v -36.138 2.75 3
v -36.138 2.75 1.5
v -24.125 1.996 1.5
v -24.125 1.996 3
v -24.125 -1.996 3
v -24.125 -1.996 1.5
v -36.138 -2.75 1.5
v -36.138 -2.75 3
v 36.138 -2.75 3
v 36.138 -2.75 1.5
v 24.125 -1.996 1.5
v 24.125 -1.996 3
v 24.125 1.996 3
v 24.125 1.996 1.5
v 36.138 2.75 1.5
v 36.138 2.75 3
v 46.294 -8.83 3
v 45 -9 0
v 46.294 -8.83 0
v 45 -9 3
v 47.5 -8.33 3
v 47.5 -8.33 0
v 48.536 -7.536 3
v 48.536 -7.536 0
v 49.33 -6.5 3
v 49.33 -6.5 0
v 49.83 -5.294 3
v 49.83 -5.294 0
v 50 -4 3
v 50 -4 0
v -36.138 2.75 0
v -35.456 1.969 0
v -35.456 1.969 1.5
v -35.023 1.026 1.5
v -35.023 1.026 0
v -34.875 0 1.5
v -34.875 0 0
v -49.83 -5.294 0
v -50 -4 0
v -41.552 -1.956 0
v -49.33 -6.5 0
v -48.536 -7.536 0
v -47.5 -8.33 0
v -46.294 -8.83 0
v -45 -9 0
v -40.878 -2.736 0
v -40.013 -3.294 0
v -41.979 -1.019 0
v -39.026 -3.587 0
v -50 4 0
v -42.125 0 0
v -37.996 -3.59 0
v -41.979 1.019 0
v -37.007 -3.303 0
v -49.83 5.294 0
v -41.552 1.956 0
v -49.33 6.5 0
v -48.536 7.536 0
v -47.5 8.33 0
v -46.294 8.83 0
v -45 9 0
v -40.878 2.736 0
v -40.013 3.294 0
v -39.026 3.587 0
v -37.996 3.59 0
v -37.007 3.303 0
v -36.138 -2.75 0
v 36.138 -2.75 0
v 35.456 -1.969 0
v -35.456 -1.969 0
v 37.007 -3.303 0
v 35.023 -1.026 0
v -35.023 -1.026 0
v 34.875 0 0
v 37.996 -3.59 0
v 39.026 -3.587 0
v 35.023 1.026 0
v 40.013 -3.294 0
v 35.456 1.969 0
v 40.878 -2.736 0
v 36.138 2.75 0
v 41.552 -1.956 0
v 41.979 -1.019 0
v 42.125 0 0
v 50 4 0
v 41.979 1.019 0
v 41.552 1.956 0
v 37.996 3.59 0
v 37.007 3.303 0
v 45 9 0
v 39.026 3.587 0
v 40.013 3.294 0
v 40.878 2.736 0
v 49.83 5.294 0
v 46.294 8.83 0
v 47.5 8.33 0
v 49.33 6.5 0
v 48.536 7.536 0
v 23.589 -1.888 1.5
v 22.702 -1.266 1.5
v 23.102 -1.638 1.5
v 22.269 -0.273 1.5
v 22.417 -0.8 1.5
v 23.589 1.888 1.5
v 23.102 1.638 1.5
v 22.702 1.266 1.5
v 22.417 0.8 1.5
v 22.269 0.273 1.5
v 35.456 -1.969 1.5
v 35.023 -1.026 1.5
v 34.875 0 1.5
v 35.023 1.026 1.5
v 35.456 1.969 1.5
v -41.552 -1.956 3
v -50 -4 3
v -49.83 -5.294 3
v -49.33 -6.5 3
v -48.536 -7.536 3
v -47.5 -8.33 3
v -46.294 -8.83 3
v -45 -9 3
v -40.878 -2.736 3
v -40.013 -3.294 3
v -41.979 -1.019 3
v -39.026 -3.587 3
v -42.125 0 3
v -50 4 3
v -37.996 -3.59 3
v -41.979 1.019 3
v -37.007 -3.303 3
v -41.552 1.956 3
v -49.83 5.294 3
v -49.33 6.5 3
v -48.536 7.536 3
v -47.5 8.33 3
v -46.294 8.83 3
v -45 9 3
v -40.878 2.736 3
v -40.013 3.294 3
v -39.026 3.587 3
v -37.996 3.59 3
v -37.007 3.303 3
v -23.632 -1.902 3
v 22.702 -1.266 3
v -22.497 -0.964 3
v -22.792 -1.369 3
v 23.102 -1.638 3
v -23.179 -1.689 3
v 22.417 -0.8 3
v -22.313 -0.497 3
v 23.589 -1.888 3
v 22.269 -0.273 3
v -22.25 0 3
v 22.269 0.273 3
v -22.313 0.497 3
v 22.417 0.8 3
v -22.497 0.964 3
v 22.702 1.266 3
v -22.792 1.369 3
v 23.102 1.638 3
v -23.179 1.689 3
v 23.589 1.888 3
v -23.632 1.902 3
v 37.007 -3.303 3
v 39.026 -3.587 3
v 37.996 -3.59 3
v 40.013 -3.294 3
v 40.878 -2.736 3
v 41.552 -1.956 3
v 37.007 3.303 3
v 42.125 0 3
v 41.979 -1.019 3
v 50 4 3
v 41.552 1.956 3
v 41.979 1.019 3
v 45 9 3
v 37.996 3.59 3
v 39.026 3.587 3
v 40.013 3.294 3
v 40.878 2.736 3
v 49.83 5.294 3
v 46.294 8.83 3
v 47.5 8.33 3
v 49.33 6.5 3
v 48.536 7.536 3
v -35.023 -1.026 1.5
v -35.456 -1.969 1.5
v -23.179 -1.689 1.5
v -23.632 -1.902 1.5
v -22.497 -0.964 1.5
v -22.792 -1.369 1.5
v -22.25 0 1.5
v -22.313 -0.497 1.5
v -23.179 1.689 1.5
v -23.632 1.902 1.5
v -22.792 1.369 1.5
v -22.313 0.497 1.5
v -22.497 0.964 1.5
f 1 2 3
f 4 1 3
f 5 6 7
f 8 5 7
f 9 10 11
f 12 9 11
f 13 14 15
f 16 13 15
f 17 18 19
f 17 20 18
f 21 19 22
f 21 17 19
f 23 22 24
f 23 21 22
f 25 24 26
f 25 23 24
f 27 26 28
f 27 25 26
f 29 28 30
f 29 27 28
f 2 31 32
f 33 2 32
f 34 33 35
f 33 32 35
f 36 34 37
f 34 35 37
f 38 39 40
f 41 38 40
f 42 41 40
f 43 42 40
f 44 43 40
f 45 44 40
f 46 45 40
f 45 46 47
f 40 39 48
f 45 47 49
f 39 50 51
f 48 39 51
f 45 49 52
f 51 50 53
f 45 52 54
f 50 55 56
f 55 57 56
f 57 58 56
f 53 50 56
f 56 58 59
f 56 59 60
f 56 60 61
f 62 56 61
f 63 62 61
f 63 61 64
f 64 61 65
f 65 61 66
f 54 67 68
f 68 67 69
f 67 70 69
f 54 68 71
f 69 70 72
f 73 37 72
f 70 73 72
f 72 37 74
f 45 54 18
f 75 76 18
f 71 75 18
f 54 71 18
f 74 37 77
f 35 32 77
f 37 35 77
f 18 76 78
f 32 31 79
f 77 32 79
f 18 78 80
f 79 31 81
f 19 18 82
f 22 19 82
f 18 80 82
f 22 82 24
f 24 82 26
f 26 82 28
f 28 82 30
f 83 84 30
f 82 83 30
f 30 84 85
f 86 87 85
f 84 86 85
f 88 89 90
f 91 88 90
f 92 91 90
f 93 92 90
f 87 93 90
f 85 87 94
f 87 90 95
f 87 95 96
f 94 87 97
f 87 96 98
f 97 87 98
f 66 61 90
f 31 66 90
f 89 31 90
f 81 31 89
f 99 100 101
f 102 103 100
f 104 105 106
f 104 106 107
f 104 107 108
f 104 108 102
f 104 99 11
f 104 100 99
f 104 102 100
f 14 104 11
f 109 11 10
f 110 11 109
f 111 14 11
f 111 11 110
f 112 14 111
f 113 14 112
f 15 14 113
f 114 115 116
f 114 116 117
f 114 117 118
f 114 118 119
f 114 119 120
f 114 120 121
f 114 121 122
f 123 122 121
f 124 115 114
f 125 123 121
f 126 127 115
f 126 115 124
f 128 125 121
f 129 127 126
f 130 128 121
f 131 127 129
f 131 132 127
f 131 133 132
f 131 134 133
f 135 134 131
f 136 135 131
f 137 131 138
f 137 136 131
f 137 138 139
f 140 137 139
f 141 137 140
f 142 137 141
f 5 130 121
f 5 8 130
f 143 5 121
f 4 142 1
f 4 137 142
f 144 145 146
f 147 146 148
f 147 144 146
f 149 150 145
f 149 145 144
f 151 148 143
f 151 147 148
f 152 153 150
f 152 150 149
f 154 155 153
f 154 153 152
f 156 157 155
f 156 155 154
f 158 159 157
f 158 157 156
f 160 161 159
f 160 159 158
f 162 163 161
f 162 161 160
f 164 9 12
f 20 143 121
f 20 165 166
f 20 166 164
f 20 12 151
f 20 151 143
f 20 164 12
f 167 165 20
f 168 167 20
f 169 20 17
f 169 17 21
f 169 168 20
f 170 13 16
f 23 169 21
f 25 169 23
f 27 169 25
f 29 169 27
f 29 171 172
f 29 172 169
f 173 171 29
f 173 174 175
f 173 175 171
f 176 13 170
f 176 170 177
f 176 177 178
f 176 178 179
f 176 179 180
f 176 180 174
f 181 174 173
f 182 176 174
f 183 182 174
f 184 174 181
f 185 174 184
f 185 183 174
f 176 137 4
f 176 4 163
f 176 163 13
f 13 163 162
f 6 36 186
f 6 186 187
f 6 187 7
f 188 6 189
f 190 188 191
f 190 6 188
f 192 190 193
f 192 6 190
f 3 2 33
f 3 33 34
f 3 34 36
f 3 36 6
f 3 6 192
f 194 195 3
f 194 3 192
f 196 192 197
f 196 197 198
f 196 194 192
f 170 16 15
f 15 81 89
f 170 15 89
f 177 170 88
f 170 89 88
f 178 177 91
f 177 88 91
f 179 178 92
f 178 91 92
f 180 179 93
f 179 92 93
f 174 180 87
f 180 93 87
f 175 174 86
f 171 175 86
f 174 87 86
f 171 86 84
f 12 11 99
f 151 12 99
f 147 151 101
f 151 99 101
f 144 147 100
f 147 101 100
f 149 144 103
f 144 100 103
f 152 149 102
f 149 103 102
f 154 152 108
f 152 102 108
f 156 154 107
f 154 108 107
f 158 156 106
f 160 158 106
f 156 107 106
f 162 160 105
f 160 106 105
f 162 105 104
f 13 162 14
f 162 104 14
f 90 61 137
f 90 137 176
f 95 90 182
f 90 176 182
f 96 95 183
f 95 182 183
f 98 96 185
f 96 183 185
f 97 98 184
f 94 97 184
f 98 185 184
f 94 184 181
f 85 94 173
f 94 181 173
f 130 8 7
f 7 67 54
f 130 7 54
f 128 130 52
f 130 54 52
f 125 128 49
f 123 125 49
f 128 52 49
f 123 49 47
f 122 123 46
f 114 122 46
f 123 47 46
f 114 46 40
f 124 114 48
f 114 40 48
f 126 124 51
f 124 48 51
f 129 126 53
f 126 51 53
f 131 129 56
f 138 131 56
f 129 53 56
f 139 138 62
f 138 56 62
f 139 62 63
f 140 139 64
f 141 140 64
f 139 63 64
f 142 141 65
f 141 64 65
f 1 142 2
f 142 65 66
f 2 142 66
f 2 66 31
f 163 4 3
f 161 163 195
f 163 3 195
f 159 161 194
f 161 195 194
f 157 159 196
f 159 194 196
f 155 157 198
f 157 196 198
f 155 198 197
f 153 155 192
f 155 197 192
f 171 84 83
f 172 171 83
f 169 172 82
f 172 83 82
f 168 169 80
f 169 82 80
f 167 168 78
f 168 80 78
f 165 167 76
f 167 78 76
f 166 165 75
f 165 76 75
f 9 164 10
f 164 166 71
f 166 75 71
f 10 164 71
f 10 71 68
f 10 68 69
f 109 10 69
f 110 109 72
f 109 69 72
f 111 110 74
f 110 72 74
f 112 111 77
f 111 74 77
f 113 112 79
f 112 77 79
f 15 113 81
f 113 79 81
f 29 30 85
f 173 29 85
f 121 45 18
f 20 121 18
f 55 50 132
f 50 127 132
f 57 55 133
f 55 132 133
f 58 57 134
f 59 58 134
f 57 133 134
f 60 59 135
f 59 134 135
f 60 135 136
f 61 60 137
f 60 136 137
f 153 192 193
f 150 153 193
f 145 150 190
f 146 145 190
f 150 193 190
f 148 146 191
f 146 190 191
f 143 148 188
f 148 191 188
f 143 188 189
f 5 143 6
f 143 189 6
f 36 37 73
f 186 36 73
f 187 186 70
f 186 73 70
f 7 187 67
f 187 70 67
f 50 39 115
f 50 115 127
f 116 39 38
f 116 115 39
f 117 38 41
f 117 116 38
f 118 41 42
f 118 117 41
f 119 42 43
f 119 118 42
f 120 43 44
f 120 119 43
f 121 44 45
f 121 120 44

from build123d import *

# Parameters (mm, degrees)
F0_W     = 100
F0_H     = 18
F1_DEPTH = 3
F2_R     = 5
F3_DEPTH = 1.5
F4_DEPTH = 1.5


with BuildPart() as f1:
    # F0 (on Top) → F1 (new body)
    with BuildSketch(Plane.XY):
        Rectangle(F0_W, F0_H)
        with BuildLine():
            ThreePointArc((-36.138195, -2.75), (-42.125, 0), (-36.138195, 2.75))
            Line((-36.138195, 2.75), (-24.124733, 1.996073))
            ThreePointArc((-24.124733, 1.996073), (-22.79217, 1.369209), (-22.25, 0))
            ThreePointArc((-22.25, 0), (-22.79217, -1.369209), (-24.124733, -1.996073))
            Line((-24.124733, -1.996073), (-36.138195, -2.75))
        make_face(mode=Mode.SUBTRACT)
        with BuildLine():
            ThreePointArc((36.138195, 2.75), (40.013123, 3.294098), (42.125, 0))
            ThreePointArc((42.125, 0), (40.013123, -3.294098), (36.138195, -2.75))
            Line((36.138195, -2.75), (24.124733, -1.996073))
            ThreePointArc((24.124733, -1.996073), (22.25, 0), (24.124733, 1.996073))
            Line((24.124733, 1.996073), (36.138195, 2.75))
        make_face(mode=Mode.SUBTRACT)
    extrude(amount=F1_DEPTH)

    # F2
    f2_edges = [f1.edges().sort_by_distance(p)[0] for p in [
        (-50, 9, 1.5),
        (-50, -9, 1.5),
        (50, 9, 1.5),
        (50, -9, 1.5),
    ]]
    fillet(f2_edges, radius=F2_R)

    # F0 (on Top) → F3 (join)
    with BuildSketch(Plane.XY):
        with BuildLine():
            ThreePointArc((-36.138195, 2.75), (-35.205902, 1.513123), (-34.875, 0))
            ThreePointArc((-34.875, 0), (-35.205902, -1.513123), (-36.138195, -2.75))
            Line((-36.138195, -2.75), (-24.124733, -1.996073))
            ThreePointArc((-24.124733, -1.996073), (-26.25, 0), (-24.124733, 1.996073))
            Line((-24.124733, 1.996073), (-36.138195, 2.75))
        make_face()
        with BuildLine():
            ThreePointArc((-22.25, 0), (-22.79217, 1.369209), (-24.124733, 1.996073))
            ThreePointArc((-24.124733, 1.996073), (-26.25, 0), (-24.124733, -1.996073))
            ThreePointArc((-24.124733, -1.996073), (-22.79217, -1.369209), (-22.25, 0))
        make_face()
    extrude(amount=F3_DEPTH)

    # F0 (on Top) → F4 (join)
    with BuildSketch(Plane.XY):
        with BuildLine():
            ThreePointArc((36.138195, -2.75), (34.875, 0), (36.138195, 2.75))
            Line((36.138195, 2.75), (24.124733, 1.996073))
            ThreePointArc((24.124733, 1.996073), (25.619209, 1.45783), (26.25, 0))
            ThreePointArc((26.25, 0), (25.619209, -1.45783), (24.124733, -1.996073))
            Line((24.124733, -1.996073), (36.138195, -2.75))
        make_face()
        with BuildLine():
            ThreePointArc((26.25, 0), (25.619209, 1.45783), (24.124733, 1.996073))
            ThreePointArc((24.124733, 1.996073), (22.25, 0), (24.124733, -1.996073))
            ThreePointArc((24.124733, -1.996073), (25.619209, -1.45783), (26.25, 0))
        make_face()
    extrude(amount=F4_DEPTH)


solid = f1.part
